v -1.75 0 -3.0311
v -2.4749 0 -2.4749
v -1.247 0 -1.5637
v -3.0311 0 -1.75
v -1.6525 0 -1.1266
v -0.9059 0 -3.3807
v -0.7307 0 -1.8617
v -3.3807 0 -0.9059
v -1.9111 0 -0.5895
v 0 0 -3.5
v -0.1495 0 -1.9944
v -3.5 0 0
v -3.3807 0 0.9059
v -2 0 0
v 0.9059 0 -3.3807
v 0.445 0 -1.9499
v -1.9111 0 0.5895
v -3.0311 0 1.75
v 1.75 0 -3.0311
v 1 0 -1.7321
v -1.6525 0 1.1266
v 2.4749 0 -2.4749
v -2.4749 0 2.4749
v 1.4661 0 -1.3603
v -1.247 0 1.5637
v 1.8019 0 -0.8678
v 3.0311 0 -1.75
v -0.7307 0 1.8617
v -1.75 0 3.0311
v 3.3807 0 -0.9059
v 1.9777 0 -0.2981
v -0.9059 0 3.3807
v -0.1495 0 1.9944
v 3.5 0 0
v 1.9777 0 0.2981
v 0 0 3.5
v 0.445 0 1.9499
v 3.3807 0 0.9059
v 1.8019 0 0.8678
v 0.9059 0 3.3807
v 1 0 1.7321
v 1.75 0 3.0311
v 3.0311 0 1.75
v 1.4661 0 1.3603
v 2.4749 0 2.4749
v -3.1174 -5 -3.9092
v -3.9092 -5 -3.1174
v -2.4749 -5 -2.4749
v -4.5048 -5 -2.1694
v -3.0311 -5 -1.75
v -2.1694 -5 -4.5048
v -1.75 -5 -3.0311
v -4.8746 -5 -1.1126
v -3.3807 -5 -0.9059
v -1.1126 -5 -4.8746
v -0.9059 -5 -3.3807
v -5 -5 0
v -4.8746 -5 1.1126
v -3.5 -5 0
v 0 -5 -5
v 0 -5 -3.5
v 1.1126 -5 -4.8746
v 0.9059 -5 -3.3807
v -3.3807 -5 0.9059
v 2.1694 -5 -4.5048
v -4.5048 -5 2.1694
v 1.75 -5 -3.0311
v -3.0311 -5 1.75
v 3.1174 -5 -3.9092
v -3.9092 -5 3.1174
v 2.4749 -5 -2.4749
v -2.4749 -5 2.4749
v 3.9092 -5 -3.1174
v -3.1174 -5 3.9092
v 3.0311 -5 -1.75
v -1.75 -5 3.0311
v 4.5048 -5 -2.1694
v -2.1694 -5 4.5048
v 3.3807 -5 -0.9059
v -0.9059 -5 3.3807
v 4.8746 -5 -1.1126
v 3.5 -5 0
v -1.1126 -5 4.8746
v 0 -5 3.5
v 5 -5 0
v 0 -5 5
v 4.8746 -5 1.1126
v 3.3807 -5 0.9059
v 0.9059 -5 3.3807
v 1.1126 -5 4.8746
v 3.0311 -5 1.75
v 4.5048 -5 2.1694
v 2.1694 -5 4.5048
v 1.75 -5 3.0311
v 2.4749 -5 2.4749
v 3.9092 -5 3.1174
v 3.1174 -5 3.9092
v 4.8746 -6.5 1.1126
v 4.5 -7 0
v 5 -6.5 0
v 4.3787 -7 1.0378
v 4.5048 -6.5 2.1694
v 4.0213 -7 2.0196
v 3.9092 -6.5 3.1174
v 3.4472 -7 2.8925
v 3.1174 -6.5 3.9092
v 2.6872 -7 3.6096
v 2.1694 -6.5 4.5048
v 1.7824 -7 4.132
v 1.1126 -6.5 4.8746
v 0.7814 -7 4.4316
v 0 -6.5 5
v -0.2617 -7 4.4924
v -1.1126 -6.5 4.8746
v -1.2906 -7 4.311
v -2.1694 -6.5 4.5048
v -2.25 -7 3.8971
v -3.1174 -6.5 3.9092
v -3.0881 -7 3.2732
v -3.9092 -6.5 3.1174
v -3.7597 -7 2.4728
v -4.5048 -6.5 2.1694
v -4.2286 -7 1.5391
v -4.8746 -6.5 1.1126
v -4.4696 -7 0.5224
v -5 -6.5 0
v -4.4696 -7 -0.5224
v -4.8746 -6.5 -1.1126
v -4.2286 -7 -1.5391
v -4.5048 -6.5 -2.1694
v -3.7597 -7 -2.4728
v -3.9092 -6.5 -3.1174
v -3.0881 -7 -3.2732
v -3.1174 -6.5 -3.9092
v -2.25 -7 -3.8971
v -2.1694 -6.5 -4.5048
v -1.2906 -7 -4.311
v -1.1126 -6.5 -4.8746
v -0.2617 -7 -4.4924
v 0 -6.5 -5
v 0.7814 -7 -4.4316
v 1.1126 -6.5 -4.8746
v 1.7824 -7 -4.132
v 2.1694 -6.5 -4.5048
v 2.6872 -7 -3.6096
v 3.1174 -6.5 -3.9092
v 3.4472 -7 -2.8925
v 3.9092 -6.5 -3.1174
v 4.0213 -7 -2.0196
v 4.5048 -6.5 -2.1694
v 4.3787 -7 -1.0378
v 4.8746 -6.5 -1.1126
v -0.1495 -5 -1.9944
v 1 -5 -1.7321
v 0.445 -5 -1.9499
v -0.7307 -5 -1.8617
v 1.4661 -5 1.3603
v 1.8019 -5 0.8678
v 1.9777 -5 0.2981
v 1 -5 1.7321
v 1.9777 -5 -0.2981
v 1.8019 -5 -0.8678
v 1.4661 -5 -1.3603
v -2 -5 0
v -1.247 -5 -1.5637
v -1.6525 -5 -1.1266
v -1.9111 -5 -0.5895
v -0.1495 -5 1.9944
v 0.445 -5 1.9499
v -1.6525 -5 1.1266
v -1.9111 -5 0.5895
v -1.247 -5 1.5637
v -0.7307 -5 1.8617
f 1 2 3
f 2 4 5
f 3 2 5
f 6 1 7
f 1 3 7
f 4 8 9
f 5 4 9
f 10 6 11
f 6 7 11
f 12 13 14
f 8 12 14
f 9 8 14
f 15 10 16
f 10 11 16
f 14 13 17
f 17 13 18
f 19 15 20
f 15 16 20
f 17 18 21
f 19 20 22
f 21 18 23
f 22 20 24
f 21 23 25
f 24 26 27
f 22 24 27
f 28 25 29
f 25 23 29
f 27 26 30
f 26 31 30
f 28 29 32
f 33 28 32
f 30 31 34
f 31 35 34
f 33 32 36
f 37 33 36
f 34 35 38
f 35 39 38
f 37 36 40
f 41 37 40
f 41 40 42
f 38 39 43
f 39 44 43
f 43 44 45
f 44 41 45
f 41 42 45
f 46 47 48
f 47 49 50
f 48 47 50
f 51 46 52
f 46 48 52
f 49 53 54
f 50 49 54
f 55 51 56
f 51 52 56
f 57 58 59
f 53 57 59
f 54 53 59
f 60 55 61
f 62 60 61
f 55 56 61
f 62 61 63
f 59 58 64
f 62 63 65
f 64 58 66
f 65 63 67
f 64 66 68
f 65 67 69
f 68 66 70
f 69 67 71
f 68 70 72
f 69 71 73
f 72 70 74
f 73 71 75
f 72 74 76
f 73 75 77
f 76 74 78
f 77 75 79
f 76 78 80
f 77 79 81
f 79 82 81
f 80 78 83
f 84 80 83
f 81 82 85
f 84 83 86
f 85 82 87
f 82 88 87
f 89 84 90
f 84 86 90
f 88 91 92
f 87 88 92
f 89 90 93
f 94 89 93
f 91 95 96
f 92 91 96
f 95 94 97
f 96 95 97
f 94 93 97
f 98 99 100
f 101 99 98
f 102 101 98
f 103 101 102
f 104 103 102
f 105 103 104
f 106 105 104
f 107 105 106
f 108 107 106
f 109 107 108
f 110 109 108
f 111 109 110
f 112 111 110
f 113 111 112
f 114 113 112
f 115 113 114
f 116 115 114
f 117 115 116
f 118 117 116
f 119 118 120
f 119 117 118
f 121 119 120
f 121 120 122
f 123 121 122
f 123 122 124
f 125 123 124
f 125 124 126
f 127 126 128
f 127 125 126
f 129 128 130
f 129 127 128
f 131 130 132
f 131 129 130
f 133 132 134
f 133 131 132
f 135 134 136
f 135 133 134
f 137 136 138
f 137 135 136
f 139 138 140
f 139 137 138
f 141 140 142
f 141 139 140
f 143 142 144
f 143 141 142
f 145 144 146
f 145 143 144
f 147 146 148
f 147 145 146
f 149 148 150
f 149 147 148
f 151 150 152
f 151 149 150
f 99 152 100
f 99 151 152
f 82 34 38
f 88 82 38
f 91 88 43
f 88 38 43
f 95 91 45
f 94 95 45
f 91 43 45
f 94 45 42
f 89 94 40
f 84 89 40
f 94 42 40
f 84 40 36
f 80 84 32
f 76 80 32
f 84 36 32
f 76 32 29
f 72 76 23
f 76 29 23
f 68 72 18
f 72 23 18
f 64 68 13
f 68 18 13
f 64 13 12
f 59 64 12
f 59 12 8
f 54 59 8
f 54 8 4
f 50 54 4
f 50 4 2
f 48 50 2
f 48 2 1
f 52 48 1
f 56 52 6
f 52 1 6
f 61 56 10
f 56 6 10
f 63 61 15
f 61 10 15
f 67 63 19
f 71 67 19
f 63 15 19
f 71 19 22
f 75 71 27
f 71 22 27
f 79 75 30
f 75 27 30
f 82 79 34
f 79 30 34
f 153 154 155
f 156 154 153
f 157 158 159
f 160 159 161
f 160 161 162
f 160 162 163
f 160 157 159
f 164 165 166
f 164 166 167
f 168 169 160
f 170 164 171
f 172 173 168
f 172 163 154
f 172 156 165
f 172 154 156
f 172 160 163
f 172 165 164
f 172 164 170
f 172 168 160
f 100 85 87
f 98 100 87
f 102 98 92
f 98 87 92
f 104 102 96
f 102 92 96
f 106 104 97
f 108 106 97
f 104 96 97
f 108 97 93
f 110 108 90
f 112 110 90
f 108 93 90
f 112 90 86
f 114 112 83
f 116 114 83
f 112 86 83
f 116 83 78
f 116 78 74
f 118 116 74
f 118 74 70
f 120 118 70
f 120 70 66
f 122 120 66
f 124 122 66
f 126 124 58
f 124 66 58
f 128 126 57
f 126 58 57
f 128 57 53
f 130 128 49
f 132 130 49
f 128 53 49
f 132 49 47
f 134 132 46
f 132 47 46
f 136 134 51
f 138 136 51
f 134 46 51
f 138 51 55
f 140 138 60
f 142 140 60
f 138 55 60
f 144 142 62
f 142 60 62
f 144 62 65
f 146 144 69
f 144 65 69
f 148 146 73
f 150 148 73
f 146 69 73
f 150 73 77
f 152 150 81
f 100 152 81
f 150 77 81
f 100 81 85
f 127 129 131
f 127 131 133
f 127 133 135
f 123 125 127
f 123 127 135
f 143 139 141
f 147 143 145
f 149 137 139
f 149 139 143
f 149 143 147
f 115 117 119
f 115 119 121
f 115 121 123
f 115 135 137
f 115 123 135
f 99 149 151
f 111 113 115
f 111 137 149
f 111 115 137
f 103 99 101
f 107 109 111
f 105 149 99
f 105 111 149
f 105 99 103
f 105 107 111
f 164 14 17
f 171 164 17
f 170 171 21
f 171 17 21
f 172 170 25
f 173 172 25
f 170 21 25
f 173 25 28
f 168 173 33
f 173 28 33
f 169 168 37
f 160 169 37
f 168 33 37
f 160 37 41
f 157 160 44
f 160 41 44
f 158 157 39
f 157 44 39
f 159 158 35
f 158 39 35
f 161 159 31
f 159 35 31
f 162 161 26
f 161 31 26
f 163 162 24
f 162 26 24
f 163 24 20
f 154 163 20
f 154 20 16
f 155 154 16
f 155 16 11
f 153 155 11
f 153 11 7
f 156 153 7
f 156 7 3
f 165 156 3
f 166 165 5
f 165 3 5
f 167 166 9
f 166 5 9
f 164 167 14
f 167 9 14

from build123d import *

# Parameters (mm, degrees)
F0_R     = 3.5
F1_DEPTH = 5
F2_R     = 5
F2_R_2   = 3.5
F3_DEPTH = 2
F4_R     = 2
F5_DEPTH = 5
F6_SIZE  = 0.5


with BuildPart() as f1:
    # F0 (on Front) → F1 (new body)
    with BuildSketch(Plane.XZ):
        Circle(F0_R)
    extrude(amount=F1_DEPTH)

    # F2 (on face) → F3 (join)
    with BuildSketch(Plane.XZ.offset(5)):
        Circle(F2_R)
        Circle(F2_R_2, mode=Mode.SUBTRACT)
        Circle(F2_R_2)
    extrude(amount=F3_DEPTH)

    # F4 (on face) → F5 (cut, through all)
    with BuildSketch(Plane(origin=(0, 0, 0), x_dir=(-1, 0, 0), z_dir=(0, 1, 0))):
        Circle(F4_R)
    extrude(amount=-F5_DEPTH, mode=Mode.SUBTRACT)

    # F6
    f6_edges = [f1.edges().sort_by_distance(p)[0] for p in [
        (-5, -7, 0),
    ]]
    chamfer(f6_edges, length=F6_SIZE)


solid = f1.part
